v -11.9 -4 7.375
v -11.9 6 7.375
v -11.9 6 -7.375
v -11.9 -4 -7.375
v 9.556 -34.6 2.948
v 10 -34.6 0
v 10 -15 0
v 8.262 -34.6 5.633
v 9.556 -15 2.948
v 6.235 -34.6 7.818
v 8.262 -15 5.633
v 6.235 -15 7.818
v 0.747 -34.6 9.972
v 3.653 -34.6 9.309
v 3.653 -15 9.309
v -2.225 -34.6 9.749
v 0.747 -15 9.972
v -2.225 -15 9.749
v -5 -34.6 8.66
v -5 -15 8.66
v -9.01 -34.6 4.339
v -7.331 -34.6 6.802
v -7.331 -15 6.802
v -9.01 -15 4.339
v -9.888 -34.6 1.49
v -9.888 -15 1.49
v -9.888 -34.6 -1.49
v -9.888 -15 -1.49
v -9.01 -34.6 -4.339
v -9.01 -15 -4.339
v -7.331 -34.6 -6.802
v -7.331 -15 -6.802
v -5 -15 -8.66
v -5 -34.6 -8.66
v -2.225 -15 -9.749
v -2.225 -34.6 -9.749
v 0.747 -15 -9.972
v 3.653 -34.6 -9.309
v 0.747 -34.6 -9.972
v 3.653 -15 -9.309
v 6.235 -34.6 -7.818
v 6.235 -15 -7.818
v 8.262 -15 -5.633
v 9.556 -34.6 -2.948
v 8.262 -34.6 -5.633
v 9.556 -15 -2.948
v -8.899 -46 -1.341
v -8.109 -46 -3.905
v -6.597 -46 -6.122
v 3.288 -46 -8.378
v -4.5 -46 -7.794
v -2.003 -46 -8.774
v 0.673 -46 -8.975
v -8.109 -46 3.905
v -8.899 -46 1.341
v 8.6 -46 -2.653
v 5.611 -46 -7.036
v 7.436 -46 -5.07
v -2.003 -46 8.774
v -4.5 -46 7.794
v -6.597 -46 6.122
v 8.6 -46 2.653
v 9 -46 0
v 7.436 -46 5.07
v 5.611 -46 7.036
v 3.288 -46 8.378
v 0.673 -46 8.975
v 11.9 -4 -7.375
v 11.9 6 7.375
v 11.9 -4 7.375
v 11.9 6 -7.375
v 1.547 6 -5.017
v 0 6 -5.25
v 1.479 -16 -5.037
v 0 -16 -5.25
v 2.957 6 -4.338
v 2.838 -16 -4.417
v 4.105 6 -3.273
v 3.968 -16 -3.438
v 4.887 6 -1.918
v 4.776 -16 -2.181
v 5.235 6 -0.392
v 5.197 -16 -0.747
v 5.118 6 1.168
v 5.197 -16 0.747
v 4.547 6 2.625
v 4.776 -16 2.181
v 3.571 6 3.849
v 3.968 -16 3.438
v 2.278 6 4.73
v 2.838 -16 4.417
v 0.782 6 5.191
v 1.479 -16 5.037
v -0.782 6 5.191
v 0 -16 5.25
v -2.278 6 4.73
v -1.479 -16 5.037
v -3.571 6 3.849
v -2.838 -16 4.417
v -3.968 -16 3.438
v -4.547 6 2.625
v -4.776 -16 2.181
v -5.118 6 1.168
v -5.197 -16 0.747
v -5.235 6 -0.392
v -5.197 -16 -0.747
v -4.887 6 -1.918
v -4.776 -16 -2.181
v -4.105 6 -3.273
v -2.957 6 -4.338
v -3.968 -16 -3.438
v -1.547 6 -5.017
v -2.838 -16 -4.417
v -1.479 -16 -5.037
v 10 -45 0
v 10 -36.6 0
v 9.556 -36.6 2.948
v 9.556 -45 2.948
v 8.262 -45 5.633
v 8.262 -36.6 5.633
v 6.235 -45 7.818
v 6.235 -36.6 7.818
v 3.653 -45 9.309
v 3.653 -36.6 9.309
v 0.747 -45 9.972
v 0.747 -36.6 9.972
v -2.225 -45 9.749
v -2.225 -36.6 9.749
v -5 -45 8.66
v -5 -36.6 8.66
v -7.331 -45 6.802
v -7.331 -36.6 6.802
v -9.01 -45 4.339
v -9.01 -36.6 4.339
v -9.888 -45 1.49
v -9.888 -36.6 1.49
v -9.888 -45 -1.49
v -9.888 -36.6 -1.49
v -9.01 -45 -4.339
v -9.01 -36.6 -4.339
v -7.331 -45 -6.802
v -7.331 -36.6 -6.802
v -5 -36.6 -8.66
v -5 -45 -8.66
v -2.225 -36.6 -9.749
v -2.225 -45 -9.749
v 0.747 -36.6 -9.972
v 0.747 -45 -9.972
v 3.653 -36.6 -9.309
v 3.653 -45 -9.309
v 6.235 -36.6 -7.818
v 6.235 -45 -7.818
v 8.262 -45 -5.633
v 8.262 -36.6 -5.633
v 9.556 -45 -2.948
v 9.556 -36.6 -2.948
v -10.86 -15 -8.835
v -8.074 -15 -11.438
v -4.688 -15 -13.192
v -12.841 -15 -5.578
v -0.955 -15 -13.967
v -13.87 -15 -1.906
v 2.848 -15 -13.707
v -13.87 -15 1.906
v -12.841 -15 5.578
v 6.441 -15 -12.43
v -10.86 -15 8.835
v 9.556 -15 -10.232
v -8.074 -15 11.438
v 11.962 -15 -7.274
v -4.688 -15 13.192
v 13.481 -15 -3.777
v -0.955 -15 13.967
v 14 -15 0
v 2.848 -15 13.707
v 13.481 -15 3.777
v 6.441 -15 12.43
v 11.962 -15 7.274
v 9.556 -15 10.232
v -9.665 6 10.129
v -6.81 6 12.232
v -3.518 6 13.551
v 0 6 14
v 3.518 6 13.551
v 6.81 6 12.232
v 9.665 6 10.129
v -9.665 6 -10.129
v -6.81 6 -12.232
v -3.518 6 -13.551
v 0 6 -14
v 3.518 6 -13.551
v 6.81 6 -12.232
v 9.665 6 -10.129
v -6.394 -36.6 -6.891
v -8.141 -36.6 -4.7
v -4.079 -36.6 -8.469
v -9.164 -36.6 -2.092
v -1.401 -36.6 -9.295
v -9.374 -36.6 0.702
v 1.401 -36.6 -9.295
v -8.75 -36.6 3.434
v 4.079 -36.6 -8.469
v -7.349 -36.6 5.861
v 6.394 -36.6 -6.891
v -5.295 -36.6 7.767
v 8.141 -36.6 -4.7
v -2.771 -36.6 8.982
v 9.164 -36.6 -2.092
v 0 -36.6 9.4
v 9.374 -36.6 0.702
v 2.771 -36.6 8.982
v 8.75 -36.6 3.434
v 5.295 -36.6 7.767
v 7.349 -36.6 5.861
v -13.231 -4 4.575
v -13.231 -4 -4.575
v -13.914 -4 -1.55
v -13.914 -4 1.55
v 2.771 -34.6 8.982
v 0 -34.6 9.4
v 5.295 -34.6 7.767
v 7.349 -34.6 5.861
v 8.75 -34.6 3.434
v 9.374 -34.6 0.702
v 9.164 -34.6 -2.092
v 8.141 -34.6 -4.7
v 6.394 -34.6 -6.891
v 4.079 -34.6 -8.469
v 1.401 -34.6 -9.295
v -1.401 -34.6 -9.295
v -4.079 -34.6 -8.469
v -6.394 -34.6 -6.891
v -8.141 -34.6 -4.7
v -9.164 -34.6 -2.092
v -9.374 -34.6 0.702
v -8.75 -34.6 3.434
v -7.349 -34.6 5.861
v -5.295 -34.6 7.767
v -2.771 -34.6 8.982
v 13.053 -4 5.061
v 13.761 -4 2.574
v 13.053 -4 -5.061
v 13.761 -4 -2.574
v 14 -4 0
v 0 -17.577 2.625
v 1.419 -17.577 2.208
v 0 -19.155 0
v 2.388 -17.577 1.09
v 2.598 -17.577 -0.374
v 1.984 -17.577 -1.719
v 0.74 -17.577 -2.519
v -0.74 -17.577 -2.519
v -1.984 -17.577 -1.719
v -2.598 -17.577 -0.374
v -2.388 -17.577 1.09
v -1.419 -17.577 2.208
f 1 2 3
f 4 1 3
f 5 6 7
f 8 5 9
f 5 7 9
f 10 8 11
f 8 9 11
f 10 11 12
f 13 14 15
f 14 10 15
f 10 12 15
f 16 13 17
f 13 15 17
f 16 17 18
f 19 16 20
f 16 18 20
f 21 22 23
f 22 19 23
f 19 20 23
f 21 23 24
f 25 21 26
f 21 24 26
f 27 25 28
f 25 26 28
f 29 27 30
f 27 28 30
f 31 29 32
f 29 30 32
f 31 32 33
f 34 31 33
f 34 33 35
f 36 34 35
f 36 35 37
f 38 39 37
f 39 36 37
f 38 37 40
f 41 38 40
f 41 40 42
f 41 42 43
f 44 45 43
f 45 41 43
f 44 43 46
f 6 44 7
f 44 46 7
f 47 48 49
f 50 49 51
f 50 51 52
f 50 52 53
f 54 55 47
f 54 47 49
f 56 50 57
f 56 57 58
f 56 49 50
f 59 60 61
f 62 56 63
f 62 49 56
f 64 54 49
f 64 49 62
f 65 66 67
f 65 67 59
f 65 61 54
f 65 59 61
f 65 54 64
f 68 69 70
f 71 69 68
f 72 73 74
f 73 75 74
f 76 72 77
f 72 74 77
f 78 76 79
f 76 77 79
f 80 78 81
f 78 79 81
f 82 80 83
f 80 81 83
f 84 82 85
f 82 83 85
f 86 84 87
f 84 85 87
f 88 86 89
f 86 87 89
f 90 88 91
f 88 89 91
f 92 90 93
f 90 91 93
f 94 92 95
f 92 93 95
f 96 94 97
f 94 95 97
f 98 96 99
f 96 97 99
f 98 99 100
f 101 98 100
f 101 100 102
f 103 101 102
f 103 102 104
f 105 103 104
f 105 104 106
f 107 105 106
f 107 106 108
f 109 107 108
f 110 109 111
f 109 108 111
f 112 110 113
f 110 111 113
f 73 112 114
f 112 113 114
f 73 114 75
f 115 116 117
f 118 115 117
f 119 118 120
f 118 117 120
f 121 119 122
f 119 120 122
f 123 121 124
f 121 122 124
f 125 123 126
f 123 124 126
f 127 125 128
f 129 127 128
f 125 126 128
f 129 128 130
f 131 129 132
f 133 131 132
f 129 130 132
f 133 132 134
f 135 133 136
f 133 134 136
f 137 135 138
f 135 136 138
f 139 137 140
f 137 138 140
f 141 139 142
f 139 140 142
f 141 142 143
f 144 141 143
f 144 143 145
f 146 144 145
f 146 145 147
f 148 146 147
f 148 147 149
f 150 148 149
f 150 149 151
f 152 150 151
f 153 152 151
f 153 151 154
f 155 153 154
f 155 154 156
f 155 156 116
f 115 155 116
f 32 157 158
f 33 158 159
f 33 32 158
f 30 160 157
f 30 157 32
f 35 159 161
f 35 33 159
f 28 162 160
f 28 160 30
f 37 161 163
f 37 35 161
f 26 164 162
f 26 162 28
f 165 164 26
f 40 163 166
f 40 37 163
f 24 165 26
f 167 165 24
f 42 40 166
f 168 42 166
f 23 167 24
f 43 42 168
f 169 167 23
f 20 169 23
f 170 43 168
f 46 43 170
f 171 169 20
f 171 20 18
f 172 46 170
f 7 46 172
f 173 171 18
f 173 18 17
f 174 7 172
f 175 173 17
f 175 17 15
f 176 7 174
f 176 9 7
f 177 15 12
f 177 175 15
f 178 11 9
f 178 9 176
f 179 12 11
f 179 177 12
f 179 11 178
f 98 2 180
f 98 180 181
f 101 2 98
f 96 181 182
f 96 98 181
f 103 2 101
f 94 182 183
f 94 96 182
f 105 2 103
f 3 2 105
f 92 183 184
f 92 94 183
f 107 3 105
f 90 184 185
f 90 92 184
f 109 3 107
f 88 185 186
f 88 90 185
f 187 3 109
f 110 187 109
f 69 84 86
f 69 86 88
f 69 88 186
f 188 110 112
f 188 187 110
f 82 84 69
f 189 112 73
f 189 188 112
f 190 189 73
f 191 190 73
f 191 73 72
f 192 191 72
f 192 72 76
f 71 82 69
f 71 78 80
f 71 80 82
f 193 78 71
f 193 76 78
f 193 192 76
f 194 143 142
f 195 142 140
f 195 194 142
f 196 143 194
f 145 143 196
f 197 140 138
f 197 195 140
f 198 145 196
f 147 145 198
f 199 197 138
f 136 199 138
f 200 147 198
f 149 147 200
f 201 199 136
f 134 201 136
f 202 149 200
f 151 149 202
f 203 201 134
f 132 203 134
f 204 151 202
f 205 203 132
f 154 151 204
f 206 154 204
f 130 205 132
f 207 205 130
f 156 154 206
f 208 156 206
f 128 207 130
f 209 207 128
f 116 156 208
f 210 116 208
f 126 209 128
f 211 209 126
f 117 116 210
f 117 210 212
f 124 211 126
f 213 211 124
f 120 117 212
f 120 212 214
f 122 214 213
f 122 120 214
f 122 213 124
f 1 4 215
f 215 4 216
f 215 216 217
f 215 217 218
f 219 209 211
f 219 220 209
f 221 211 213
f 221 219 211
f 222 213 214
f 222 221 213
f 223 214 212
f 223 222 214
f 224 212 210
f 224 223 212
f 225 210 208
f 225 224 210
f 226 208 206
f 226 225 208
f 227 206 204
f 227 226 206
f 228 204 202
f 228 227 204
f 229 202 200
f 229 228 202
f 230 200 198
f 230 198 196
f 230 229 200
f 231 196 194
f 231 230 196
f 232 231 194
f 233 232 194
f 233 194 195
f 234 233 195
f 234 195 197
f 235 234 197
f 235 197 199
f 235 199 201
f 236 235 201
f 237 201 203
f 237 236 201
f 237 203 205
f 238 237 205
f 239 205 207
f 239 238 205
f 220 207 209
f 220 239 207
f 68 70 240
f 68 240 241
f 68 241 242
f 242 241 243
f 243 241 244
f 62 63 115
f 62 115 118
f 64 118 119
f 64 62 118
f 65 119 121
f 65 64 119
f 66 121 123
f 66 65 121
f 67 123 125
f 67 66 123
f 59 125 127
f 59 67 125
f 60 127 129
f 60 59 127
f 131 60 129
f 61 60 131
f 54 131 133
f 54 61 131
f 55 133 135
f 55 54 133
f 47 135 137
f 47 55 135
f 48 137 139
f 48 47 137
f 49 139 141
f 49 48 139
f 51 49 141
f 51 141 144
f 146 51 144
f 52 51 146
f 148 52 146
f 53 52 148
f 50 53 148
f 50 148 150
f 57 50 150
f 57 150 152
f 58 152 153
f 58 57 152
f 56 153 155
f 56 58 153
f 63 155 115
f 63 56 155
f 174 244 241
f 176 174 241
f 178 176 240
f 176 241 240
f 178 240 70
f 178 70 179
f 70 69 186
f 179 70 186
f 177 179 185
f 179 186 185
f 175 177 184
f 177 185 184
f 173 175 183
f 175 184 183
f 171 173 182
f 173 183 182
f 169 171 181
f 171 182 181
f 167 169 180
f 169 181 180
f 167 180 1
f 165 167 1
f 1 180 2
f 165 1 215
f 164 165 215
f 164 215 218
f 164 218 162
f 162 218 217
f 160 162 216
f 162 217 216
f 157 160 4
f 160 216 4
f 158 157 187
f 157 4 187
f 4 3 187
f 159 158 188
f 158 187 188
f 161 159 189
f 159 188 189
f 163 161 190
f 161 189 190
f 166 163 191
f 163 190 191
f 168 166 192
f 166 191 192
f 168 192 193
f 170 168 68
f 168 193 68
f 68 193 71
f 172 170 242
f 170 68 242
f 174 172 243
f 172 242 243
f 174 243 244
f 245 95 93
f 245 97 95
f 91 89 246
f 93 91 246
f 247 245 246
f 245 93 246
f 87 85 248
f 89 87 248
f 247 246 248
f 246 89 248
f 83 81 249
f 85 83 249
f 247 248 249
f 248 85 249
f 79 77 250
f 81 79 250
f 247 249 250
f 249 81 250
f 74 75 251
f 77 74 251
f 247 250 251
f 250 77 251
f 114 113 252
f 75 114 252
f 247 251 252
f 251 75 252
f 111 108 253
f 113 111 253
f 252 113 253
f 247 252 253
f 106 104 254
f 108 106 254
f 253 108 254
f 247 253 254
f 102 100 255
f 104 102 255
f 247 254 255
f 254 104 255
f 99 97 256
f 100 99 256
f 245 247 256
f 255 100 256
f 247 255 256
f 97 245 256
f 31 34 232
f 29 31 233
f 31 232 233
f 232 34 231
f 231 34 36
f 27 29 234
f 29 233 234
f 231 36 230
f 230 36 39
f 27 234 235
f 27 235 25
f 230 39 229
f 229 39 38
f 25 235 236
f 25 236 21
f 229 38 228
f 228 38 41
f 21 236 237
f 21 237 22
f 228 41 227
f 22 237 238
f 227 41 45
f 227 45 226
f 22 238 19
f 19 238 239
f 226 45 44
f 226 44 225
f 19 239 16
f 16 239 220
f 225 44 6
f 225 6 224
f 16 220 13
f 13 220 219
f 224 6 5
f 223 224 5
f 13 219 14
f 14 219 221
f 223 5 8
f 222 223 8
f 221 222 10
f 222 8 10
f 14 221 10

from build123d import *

# Parameters (mm, degrees)
SKETCH1_R                        = 14
BOSS_EXTRUDE1_DEPTH              = 6
SKETCH2_R                        = 14
BOSS_EXTRUDE2_DEPTH              = 15
SKETCH3_R                        = 10
BOSS_EXTRUDE3_DEPTH              = 31
F_10_5_10_5_DIAMETER_HOLE1_D     = 10.5
F_10_5_10_5_DIAMETER_HOLE1_DEPTH = 22
F_10_5_10_5_DIAMETER_HOLE1_TIP   = 3.15451825
CHAMFER1_SIZE                    = 1
SKETCH5_W                        = 6.241360462
SKETCH5_H                        = 33.57083513
SKETCH5_W_2                      = 3.803761641
CUT_EXTRUDE2_DEPTH               = 10
SKETCH6_W                        = 1.2
SKETCH6_H                        = 2


with BuildPart() as part:
    # Sketch1 → Boss-Extrude1 (new body)
    with BuildSketch(Plane(origin=(0, 0, 0), x_dir=(1, 0, 0), z_dir=(0, 1, 0))):
        Circle(SKETCH1_R)
    extrude(amount=BOSS_EXTRUDE1_DEPTH)

    # Sketch2 → Boss-Extrude2 (add)
    with BuildSketch(Plane.XZ):
        Circle(SKETCH2_R)
    extrude(amount=BOSS_EXTRUDE2_DEPTH)

    # Sketch3 → Boss-Extrude3 (add)
    with BuildSketch(Plane.XZ.offset(15)):
        Circle(SKETCH3_R)
    extrude(amount=BOSS_EXTRUDE3_DEPTH)

    # Ø10.5 (10.5) Diameter Hole1
    with Locations(Plane.ZX.offset(6)):
        with Locations((0, 0)):
            Hole(F_10_5_10_5_DIAMETER_HOLE1_D / 2, depth=F_10_5_10_5_DIAMETER_HOLE1_DEPTH)
            with Locations((0, 0, -(F_10_5_10_5_DIAMETER_HOLE1_DEPTH + F_10_5_10_5_DIAMETER_HOLE1_TIP / 2))):  # 118° drill point
                Cone(0, F_10_5_10_5_DIAMETER_HOLE1_D / 2, F_10_5_10_5_DIAMETER_HOLE1_TIP, mode=Mode.SUBTRACT)

    # Chamfer1
    chamfer1_edges = [part.edges().sort_by_distance(p)[0] for p in [
        (-10, -46, 0),
    ]]
    chamfer(chamfer1_edges, length=CHAMFER1_SIZE)

    # Sketch5 → Cut-Extrude2 (cut)
    with BuildSketch(Plane(origin=(0, 6, 0), x_dir=(1, 0, 0), z_dir=(0, 1, 0))):
        with Locations((-15.020680231, 0)):
            Rectangle(SKETCH5_W, SKETCH5_H)
        with Locations((13.801880821, 0)):
            Rectangle(SKETCH5_W_2, SKETCH5_H)
    extrude(amount=-CUT_EXTRUDE2_DEPTH, mode=Mode.SUBTRACT)

    # Sketch6 → Cut-Revolve1 (revolve, cut)
    with BuildSketch(Plane(origin=(0, 0, 0), x_dir=(0, 0, -1), z_dir=(1, 0, 0))):
        with Locations((-10, -35.6)):
            Rectangle(SKETCH6_W, SKETCH6_H)
    revolve(axis=Axis((0, -46, 0), (0, 1, 0)), mode=Mode.SUBTRACT)


solid = part.part
